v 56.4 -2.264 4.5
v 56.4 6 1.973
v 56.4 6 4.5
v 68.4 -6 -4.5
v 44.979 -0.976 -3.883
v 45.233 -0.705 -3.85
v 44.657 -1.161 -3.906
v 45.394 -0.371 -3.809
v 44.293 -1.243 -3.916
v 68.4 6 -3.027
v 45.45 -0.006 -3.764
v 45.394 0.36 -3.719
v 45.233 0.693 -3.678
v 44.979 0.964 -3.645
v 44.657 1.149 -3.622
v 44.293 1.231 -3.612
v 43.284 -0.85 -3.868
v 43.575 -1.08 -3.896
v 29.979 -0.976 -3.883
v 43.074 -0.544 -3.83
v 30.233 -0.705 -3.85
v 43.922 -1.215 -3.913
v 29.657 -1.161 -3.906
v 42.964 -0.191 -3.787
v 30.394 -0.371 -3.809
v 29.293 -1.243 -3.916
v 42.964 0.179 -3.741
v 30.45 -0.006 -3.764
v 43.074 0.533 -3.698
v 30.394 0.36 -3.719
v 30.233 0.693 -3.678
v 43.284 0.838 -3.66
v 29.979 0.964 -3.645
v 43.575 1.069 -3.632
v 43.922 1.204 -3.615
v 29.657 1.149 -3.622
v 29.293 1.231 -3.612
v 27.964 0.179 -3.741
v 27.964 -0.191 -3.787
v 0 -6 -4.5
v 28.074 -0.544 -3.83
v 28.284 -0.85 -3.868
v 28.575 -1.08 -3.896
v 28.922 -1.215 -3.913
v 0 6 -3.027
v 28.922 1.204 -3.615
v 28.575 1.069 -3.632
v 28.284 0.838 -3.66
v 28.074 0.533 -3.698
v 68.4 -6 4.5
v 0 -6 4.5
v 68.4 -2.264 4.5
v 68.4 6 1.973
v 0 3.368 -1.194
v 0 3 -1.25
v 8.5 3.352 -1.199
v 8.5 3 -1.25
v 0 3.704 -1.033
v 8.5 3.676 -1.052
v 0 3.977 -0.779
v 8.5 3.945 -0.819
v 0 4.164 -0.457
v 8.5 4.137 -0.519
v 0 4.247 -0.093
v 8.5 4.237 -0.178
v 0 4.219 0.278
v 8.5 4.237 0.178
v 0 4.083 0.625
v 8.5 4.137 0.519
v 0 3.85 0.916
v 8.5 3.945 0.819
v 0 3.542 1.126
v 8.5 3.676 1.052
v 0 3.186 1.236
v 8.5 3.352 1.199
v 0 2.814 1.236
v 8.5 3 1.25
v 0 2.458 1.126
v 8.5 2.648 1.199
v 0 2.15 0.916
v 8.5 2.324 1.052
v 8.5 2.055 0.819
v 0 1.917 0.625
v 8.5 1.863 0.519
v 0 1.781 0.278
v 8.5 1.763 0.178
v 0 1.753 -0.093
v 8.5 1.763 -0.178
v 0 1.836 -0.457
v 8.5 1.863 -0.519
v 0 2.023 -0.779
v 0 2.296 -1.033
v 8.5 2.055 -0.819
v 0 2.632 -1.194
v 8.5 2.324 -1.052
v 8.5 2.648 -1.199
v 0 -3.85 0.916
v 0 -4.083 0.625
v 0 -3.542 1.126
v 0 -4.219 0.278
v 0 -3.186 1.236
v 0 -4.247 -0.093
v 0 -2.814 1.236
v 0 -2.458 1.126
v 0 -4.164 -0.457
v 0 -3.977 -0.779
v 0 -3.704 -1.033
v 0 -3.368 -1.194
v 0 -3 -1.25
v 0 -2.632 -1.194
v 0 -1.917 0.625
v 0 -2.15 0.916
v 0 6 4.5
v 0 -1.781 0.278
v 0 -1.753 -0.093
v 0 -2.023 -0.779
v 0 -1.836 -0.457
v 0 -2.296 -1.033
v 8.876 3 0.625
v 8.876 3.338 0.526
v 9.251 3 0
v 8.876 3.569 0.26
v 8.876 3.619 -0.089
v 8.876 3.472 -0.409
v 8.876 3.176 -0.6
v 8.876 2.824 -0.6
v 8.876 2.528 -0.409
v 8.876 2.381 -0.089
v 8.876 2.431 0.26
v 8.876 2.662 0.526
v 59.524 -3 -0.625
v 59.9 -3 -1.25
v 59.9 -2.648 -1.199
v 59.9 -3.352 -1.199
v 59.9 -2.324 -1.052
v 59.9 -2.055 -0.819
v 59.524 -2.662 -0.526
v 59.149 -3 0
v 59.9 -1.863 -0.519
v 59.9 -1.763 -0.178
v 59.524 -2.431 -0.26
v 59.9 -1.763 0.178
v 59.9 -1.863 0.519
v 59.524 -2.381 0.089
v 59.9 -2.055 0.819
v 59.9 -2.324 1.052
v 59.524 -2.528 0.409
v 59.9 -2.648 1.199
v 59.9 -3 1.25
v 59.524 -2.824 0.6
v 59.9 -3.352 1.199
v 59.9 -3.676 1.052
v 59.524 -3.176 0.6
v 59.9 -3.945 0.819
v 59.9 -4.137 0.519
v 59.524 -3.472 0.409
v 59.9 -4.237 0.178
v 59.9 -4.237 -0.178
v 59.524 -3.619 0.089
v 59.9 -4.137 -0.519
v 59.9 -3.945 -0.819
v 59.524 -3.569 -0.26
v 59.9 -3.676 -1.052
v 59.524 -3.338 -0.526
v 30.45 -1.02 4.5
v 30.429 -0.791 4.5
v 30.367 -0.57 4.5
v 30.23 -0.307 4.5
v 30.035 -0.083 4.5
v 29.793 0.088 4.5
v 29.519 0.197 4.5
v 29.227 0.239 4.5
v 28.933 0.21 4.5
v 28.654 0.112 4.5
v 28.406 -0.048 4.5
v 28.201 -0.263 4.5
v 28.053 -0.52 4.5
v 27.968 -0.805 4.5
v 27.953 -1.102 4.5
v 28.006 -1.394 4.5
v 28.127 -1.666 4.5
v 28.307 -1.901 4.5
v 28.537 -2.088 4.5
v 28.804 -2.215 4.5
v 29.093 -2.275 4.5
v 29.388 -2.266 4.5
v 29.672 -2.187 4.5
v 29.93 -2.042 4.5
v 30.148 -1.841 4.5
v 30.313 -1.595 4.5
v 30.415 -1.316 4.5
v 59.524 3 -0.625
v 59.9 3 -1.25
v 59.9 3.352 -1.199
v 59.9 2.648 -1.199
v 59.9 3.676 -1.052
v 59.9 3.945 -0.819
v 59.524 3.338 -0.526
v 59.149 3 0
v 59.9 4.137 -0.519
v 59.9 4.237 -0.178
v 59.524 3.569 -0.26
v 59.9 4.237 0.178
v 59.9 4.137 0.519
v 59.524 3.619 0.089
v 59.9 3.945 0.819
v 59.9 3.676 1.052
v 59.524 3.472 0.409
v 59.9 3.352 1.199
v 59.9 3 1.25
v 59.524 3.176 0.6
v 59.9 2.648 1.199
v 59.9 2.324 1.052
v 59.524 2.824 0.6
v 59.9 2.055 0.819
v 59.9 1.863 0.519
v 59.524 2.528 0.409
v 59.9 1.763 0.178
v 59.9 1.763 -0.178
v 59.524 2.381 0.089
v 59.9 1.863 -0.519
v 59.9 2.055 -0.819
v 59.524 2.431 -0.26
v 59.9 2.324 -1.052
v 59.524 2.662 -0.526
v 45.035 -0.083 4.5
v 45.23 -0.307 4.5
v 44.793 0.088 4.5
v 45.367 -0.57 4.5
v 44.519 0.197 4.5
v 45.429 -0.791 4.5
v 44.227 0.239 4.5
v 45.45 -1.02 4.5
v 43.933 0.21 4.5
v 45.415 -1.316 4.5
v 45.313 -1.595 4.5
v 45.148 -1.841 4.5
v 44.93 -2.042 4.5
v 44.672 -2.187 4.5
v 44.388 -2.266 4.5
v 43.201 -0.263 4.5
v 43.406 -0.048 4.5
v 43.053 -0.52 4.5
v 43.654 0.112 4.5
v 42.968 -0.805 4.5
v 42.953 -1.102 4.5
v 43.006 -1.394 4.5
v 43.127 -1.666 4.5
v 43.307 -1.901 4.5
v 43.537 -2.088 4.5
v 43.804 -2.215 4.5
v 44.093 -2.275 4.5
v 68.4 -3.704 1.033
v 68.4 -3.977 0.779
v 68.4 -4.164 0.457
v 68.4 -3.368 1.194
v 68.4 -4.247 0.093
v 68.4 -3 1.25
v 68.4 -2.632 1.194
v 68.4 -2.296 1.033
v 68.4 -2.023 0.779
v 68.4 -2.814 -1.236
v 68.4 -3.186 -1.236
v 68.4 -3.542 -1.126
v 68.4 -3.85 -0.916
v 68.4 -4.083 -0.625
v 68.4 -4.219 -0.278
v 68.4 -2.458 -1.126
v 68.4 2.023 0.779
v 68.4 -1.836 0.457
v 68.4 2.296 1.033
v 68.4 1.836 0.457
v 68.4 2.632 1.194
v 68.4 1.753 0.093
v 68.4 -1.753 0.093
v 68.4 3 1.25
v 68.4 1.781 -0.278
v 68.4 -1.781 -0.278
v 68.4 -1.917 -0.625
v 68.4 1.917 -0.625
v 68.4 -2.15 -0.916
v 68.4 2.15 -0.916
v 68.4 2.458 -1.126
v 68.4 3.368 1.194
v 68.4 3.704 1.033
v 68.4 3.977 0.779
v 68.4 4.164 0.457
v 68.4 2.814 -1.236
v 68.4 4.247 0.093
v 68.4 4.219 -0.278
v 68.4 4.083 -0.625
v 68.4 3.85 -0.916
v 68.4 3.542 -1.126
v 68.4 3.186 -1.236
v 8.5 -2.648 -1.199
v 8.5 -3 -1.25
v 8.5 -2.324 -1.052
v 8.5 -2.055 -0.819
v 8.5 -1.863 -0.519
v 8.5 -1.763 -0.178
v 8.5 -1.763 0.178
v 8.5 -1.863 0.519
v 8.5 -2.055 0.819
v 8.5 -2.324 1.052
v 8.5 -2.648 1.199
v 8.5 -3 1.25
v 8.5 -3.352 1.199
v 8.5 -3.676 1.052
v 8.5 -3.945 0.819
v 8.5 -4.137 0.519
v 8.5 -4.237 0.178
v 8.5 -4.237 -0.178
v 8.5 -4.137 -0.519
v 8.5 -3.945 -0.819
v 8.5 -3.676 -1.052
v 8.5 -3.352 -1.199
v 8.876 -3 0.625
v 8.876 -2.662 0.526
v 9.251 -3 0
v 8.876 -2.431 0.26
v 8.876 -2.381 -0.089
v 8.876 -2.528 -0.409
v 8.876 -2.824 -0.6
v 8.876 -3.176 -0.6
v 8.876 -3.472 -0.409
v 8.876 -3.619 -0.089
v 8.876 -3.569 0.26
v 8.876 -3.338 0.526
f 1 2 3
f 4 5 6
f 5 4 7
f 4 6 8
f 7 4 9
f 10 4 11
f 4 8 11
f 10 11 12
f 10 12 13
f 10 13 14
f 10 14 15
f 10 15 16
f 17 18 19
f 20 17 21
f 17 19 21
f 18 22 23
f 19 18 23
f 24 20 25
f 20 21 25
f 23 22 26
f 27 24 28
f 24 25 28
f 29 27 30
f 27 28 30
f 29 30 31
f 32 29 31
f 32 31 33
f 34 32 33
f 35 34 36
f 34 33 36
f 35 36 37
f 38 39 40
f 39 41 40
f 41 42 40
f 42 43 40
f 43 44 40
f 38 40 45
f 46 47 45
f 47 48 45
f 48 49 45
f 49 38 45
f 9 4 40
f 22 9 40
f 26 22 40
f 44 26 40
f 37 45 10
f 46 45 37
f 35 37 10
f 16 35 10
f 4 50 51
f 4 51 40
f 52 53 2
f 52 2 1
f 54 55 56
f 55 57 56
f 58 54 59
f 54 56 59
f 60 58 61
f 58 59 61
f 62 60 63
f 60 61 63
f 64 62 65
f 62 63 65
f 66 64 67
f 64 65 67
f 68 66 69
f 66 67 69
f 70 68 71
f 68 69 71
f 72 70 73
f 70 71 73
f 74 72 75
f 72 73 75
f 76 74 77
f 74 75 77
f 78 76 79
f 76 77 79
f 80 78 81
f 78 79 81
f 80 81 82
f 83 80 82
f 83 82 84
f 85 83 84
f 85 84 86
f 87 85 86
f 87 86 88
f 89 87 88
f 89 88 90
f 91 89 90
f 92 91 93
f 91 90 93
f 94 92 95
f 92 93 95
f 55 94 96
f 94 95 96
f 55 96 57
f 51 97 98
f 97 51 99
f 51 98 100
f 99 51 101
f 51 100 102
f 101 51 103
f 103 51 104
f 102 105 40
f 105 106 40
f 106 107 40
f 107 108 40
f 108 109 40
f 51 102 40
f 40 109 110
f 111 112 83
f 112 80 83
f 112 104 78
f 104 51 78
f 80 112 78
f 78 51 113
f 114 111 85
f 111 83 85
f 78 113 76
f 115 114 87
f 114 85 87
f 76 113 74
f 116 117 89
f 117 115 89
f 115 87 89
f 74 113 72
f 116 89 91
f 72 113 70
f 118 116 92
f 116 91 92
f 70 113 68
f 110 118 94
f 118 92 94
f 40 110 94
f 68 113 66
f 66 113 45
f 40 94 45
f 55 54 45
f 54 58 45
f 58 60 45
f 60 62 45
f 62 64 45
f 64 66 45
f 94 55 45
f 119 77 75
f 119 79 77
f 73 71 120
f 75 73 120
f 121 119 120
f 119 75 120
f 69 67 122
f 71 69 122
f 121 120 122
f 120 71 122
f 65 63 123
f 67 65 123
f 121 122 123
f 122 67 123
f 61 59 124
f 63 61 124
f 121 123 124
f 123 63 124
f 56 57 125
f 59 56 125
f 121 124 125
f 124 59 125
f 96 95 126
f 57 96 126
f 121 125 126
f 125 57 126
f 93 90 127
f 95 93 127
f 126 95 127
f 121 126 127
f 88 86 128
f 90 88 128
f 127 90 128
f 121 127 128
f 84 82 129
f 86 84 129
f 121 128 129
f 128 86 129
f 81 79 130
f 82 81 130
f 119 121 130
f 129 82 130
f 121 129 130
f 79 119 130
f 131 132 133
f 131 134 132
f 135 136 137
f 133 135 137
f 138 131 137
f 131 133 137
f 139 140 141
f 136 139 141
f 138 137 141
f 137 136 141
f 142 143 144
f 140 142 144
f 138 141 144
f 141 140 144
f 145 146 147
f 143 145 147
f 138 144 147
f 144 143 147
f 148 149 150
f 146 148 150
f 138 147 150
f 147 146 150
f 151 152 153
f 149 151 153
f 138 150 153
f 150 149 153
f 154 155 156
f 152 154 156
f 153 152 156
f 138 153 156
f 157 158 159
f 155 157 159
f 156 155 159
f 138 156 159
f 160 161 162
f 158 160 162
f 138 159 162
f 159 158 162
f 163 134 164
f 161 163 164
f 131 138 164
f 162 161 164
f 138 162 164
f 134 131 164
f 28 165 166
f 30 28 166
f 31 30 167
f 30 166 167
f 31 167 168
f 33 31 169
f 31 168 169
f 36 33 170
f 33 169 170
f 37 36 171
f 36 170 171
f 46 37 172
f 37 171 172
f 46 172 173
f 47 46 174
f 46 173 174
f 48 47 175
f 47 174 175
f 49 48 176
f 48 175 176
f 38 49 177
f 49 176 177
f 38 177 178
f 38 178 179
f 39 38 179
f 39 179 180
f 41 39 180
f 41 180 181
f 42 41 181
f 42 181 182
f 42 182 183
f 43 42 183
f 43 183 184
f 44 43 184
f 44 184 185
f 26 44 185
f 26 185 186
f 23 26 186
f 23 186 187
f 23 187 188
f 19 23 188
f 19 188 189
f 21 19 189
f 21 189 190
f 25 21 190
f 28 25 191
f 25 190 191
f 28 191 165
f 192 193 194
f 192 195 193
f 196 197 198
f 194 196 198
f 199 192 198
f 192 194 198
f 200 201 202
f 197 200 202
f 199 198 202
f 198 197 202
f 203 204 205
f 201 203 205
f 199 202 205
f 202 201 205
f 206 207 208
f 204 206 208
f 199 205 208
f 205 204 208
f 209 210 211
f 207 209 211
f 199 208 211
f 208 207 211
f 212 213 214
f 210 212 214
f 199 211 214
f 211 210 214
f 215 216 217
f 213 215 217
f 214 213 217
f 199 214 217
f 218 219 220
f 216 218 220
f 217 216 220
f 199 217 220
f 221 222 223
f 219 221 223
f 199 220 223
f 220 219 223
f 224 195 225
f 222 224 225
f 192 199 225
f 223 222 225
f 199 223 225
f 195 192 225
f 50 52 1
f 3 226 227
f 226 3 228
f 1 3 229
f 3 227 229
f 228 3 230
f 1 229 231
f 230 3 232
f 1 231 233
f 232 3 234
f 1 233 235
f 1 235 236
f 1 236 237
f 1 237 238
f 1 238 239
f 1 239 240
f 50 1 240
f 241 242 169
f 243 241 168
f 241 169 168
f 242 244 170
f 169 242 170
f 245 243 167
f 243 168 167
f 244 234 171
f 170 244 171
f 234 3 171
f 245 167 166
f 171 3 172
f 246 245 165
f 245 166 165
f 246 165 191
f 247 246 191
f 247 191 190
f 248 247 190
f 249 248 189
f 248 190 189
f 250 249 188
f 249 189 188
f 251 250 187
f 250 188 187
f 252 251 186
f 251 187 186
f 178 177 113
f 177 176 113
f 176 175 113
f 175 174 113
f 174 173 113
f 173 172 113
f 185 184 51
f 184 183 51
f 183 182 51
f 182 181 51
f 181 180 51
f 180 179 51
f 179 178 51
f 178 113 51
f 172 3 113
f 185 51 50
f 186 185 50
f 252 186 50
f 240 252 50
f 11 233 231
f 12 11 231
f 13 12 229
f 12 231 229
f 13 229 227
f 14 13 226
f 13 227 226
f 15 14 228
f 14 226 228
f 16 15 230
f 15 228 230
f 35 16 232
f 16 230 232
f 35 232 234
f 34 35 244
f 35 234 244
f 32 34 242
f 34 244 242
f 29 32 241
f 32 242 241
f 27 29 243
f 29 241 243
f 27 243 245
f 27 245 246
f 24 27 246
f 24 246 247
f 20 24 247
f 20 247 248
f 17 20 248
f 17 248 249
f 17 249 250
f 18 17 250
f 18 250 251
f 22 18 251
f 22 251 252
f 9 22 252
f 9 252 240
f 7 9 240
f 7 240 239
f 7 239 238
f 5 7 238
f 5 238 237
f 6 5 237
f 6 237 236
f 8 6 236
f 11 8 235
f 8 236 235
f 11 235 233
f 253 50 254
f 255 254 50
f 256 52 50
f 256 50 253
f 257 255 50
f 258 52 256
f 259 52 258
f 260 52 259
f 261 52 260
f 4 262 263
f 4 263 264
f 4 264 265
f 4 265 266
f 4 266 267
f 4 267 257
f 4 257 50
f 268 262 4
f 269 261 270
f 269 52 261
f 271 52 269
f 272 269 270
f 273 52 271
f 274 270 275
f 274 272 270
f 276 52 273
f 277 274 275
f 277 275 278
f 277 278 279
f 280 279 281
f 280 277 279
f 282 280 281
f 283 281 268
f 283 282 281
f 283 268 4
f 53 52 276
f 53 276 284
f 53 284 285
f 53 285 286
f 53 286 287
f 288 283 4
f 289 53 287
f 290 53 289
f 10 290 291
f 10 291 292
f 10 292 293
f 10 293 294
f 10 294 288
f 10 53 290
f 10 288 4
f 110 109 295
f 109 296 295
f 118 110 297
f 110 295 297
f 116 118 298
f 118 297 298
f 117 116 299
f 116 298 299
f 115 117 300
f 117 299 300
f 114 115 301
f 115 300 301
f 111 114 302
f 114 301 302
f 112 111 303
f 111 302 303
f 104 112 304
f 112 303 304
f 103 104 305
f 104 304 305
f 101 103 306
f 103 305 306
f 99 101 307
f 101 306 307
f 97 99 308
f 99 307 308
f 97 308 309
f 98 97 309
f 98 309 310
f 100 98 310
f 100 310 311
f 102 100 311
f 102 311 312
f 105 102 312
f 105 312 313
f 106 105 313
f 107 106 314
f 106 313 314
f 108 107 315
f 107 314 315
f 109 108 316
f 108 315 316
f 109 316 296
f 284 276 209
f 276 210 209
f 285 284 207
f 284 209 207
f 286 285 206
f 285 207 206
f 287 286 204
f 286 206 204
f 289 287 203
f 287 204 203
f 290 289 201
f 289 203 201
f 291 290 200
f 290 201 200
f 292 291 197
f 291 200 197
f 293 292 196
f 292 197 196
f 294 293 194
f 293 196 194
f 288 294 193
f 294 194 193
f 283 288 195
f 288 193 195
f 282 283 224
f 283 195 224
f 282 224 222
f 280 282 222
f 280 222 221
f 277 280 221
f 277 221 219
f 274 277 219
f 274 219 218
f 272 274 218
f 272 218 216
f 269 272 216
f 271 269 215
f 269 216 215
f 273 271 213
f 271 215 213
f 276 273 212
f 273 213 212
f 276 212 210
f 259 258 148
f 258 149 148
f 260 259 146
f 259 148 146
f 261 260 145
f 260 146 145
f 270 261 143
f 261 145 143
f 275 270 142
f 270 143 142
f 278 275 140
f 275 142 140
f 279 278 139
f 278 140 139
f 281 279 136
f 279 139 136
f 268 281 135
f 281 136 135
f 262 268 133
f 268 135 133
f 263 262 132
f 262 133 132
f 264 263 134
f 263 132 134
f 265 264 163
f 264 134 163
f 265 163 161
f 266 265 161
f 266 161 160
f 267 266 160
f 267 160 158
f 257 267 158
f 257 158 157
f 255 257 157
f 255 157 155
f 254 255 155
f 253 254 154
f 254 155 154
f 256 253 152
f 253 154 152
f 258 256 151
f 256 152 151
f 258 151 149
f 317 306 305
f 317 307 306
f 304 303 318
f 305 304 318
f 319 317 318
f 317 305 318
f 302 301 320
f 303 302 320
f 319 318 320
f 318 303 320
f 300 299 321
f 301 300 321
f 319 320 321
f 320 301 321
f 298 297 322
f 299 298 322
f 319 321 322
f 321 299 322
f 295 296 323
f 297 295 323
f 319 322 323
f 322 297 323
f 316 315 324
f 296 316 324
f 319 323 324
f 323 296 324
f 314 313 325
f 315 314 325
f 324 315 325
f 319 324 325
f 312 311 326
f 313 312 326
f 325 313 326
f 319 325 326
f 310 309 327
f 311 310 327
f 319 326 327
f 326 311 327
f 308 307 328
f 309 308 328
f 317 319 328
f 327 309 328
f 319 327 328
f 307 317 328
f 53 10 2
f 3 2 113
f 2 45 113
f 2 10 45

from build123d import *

# Parameters (mm, degrees)
RESSALTO_EXTRUS_O1_DEPTH      = 68.4
CORTE_EXTRUS_O1_DEPTH         = 12
FURO_ROSCADO_DE_M3X0_51_D     = 2.5
FURO_ROSCADO_DE_M3X0_51_DEPTH = 8.5
FURO_ROSCADO_DE_M3X0_51_TIP   = 0.751075774
FURO_ROSCADO_DE_M3X0_52_D     = 2.5
FURO_ROSCADO_DE_M3X0_52_DEPTH = 8.5
FURO_ROSCADO_DE_M3X0_52_TIP   = 0.751075774
FURO_ROSCADO_DE_M3X0_53_D     = 2.5


with BuildPart() as part:
    # Esboço1 → Ressalto-extrusão1 (new body)
    with BuildSketch(Plane(origin=(0, 0, 0), x_dir=(0, 0, -1), z_dir=(1, 0, 0))):
        Polygon((-4.5, -6), (4.5, -6), (3.026585269, 6), (-4.5, 6), align=None)
    extrude(amount=RESSALTO_EXTRUS_O1_DEPTH)

    # Esboço2 → Corte-extrusão1 (cut)
    with BuildSketch(Plane(origin=(68.4, 0, 0), x_dir=(0, 0, -1), z_dir=(1, 0, 0))):
        Polygon((-1.973414731, 6), (-4.5, -2.264088043), (-4.5, 6), align=None)
    extrude(amount=-CORTE_EXTRUS_O1_DEPTH, mode=Mode.SUBTRACT)

    # Furo roscado de M3x0.51
    with Locations(Plane(origin=(68.4, 0, 0), x_dir=(0, 0, -1), z_dir=(1, 0, 0))):
        with Locations((0, -3), (0, 3)):
            Hole(FURO_ROSCADO_DE_M3X0_51_D / 2, depth=FURO_ROSCADO_DE_M3X0_51_DEPTH)
            with Locations((0, 0, -(FURO_ROSCADO_DE_M3X0_51_DEPTH + FURO_ROSCADO_DE_M3X0_51_TIP / 2))):  # 118° drill point
                Cone(0, FURO_ROSCADO_DE_M3X0_51_D / 2, FURO_ROSCADO_DE_M3X0_51_TIP, mode=Mode.SUBTRACT)

    # Furo roscado de M3x0.52
    with Locations(Plane.ZY):
        with Locations((0, 3), (0, -3)):
            Hole(FURO_ROSCADO_DE_M3X0_52_D / 2, depth=FURO_ROSCADO_DE_M3X0_52_DEPTH)
            with Locations((0, 0, -(FURO_ROSCADO_DE_M3X0_52_DEPTH + FURO_ROSCADO_DE_M3X0_52_TIP / 2))):  # 118° drill point
                Cone(0, FURO_ROSCADO_DE_M3X0_52_D / 2, FURO_ROSCADO_DE_M3X0_52_TIP, mode=Mode.SUBTRACT)

    # Furo roscado de M3x0.53 (through all)
    with Locations(Plane(origin=(0, 0.455211444, -3.707399697), x_dir=(-1, 0, 0), z_dir=(0, 0.121869343, -0.992546152))):
        with Locations((-29.2, -0.464432322), (-44.2, -0.464432322)):
            Hole(FURO_ROSCADO_DE_M3X0_53_D / 2)


solid = part.part
